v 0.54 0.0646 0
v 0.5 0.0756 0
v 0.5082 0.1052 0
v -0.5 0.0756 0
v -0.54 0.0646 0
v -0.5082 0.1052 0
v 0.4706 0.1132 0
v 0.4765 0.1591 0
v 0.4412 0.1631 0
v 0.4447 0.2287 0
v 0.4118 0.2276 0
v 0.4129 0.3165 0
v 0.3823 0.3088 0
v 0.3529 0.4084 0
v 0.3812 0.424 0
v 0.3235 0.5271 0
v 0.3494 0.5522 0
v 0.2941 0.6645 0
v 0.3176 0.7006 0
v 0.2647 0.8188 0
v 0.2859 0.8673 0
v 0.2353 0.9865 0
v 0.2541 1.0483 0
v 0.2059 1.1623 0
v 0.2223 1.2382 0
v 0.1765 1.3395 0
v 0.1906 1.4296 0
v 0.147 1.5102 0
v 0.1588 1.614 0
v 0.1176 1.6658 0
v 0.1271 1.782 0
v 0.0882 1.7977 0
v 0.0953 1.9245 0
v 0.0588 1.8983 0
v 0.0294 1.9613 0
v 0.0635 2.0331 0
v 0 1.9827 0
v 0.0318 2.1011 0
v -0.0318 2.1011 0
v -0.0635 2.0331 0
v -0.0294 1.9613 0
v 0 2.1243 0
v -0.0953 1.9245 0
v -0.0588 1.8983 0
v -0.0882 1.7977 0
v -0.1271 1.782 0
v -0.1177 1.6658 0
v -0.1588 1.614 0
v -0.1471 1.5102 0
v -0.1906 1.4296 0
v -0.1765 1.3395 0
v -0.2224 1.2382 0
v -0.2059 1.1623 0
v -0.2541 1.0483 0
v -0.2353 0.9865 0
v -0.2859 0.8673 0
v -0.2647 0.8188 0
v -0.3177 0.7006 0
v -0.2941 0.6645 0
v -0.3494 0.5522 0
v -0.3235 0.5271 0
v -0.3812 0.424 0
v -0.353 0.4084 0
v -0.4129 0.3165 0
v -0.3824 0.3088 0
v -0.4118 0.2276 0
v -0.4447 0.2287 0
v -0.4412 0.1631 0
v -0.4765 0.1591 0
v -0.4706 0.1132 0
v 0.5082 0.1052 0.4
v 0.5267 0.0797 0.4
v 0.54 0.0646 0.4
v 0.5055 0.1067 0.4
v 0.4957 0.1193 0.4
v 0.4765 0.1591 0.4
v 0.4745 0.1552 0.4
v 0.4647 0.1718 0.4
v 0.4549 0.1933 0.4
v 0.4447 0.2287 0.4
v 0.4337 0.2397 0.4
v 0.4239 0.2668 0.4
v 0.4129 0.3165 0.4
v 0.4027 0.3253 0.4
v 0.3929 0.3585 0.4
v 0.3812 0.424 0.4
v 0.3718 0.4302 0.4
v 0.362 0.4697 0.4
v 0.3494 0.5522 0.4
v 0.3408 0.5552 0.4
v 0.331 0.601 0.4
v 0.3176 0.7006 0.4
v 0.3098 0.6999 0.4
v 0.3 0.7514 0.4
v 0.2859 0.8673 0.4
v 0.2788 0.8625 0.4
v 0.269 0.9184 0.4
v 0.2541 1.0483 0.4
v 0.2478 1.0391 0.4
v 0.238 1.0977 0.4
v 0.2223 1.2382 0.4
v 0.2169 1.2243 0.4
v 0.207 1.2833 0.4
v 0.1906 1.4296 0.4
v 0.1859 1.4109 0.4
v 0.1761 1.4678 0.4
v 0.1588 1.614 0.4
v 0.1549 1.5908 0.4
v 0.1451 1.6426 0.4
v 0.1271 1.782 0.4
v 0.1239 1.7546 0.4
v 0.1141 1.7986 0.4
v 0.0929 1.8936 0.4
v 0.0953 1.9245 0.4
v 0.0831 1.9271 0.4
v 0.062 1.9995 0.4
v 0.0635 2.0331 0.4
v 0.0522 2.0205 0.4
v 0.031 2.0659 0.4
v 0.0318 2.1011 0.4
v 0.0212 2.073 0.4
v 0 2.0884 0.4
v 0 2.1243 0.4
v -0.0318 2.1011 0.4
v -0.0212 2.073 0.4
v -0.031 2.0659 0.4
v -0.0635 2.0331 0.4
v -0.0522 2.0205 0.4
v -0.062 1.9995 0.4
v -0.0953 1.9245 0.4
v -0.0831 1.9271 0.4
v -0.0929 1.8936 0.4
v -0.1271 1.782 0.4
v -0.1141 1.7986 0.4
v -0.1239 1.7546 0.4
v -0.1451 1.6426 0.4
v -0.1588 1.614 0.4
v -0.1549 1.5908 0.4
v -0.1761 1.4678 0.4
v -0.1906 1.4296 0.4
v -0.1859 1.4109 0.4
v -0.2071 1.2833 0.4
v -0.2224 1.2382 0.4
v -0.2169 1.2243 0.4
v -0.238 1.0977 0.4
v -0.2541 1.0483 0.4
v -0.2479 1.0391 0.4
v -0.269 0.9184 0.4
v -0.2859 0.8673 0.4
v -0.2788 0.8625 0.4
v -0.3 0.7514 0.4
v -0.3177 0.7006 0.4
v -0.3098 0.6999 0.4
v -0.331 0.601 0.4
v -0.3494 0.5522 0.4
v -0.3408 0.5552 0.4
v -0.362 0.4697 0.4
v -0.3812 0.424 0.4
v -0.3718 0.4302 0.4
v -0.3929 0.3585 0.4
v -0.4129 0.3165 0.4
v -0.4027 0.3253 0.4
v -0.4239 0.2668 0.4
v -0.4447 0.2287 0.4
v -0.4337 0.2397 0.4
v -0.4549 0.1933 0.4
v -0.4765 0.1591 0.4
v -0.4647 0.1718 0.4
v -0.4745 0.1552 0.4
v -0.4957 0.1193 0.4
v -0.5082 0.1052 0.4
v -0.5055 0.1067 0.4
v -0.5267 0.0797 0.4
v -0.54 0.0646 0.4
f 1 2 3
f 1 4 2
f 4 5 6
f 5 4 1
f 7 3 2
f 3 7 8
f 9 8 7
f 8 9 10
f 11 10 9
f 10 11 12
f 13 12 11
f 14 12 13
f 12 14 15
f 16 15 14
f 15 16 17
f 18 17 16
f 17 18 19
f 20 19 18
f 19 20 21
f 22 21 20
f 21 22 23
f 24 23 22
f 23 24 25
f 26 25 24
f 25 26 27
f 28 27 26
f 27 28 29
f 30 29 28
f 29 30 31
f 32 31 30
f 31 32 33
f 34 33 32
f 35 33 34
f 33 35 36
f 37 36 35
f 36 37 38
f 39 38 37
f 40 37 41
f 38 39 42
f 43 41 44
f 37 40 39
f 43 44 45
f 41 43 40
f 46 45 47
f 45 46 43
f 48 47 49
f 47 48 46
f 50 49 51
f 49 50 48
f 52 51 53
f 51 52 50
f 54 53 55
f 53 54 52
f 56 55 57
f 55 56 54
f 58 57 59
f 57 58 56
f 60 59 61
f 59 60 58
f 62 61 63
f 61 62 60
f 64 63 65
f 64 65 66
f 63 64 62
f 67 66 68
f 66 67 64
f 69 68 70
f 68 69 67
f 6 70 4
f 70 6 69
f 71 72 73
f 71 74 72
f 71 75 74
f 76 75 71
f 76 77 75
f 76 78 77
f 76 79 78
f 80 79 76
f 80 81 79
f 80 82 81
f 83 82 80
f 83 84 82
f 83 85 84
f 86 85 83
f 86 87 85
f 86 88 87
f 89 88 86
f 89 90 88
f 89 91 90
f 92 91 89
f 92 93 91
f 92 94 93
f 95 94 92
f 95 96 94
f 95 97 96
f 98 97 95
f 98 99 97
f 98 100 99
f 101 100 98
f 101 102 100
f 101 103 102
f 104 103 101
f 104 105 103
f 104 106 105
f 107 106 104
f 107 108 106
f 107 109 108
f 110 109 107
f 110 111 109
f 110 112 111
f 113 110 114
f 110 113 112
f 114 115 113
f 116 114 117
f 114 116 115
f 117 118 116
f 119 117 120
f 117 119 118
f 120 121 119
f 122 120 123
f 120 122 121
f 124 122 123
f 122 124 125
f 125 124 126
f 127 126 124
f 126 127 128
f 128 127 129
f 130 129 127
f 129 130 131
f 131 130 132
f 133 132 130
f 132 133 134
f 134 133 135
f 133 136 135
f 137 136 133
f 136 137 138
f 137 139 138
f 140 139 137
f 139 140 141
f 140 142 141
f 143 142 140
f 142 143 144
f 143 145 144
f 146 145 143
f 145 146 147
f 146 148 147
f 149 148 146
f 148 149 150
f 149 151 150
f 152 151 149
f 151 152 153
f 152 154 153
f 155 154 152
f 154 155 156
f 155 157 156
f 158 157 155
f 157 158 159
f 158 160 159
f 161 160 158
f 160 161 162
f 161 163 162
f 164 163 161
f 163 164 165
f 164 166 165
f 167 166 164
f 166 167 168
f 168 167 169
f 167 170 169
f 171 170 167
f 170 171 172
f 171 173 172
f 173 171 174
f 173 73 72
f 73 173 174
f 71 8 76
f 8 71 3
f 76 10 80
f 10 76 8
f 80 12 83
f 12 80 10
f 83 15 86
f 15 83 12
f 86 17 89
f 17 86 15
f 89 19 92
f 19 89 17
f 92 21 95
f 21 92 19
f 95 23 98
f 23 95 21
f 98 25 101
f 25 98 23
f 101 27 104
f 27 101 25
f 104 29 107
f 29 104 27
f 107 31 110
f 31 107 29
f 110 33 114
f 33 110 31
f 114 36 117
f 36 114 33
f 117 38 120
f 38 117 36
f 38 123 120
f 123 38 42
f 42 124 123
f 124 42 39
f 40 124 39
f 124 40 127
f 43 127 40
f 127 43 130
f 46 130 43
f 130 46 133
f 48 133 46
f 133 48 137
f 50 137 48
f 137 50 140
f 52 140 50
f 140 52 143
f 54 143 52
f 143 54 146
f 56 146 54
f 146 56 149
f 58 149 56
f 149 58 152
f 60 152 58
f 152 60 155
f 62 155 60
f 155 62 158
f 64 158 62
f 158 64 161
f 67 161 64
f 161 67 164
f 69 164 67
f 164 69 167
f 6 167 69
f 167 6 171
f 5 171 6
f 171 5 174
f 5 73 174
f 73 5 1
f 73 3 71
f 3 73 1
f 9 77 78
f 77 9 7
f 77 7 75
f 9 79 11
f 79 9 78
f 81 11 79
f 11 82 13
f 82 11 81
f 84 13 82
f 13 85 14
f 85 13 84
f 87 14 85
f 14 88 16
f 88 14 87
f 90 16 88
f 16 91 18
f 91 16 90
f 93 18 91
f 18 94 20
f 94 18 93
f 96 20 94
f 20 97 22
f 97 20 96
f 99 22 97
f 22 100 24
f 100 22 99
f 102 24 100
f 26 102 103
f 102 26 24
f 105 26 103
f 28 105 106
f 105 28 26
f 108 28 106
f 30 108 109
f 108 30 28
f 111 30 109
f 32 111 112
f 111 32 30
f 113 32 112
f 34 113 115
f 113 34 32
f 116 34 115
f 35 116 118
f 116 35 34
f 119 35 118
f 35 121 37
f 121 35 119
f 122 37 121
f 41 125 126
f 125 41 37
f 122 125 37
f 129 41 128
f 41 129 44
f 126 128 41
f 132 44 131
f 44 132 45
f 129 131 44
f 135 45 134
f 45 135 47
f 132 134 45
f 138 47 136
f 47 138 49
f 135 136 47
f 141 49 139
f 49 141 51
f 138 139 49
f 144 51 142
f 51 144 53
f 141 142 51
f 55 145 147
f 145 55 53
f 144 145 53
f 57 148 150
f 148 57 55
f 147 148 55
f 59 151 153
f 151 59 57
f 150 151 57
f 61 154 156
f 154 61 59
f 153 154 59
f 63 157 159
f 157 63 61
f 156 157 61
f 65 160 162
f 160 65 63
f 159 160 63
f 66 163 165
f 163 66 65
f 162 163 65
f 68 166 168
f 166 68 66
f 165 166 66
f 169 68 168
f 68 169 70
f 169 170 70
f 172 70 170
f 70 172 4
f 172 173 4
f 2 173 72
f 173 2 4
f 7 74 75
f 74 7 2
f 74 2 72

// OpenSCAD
points = [
	[0.0, 0.08764150246784269],
	[0.029411764705882353, 0.12522205086106414],
	[0.058823529411764705, 0.17508930896747815],
	[0.08823529411764705, 0.23957762943438046],
	[0.11764705882352941, 0.32080469554883195],
	[0.14705882352941177, 0.42038091158417046],
	[0.1764705882352941, 0.5390798231011418],
	[0.20588235294117646, 0.6765049599186366],
	[0.23529411764705882, 0.8308004272859445],
	[0.2647058823529412, 0.9984590452299783],
	[0.29411764705882354, 1.17427987640833],
	[0.3235294117647059, 1.3515147802114251],
	[0.3529411764705882, 1.5222213149908108],
	[0.38235294117647056, 1.677809374190975],
	[0.4117647058823529, 1.809736111919526],
	[0.4411764705882353, 1.9102741849270513],
	[0.47058823529411764, 1.9732584866391882],
	[0.5, 1.9947114020071635],
	[0.5294117647058824, 1.9732584866391882],
	[0.5588235294117647, 1.9102741849270513],
	[0.5882352941176471, 1.809736111919526],
	[0.6176470588235294, 1.677809374190975],
	[0.6470588235294118, 1.5222213149908108],
	[0.6764705882352942, 1.351514780211425],
	[0.7058823529411764, 1.1742798764083306],
	[0.7352941176470588, 0.9984590452299787],
	[0.7647058823529411, 0.8308004272859449],
	[0.7941176470588235, 0.6765049599186368],
	[0.8235294117647058, 0.5390798231011421],
	[0.8529411764705882, 0.42038091158417046],
	[0.8823529411764706, 0.32080469554883195],
	[0.9117647058823529, 0.23957762943438046],
	[0.9411764705882353, 0.17508930896747815],
	[0.9705882352941176, 0.12522205086106414],
	[1.0, 0.08764150246784269],
];
difference(){
    
// OUTER COOKIE CUTTER SHAPE
    
    // extrude the outer polygon into a 3D shape
    // this extrusion is thinner than the inner shape to make sure the inner shape "cuts" through it completely
    linear_extrude(0.4)
    
        // x- and y-shift the outer polygon to be roughly centered around the inner shape
        // z-shift the outer polygon so the extruded inner shape cuts all the way through
        translate([-0.54, -0.03, -0.1])
            
            // scale this polygon up a bit to make an outer ring of a cookie cutter
            scale(1.08, 1.08, 1.08)
            
                // generate a polygon to become the outer shape
                polygon(points);        
    
// INNER COOKIE CUTTER SHAPE TO BE SUBTRACTED FROM OUTER

    // extrude the inner polygon into a 3D shape
    // this extrusion is thicker than the outer shape to ensure the inner shape "cuts" completey through the outer shape
    // the "scale" parameter grows the shape as it extrudes to give the finished cutter a narrower edge
    linear_extrude(0.6, scale=1.08) 
    
        // x-shift the shape to 
        translate([-0.5, -0.012, 0]) //x-center the polygon at origin
            
            // generate a polygon to become the inner shape (this is effectively defining a hole)
            polygon(points);
}
